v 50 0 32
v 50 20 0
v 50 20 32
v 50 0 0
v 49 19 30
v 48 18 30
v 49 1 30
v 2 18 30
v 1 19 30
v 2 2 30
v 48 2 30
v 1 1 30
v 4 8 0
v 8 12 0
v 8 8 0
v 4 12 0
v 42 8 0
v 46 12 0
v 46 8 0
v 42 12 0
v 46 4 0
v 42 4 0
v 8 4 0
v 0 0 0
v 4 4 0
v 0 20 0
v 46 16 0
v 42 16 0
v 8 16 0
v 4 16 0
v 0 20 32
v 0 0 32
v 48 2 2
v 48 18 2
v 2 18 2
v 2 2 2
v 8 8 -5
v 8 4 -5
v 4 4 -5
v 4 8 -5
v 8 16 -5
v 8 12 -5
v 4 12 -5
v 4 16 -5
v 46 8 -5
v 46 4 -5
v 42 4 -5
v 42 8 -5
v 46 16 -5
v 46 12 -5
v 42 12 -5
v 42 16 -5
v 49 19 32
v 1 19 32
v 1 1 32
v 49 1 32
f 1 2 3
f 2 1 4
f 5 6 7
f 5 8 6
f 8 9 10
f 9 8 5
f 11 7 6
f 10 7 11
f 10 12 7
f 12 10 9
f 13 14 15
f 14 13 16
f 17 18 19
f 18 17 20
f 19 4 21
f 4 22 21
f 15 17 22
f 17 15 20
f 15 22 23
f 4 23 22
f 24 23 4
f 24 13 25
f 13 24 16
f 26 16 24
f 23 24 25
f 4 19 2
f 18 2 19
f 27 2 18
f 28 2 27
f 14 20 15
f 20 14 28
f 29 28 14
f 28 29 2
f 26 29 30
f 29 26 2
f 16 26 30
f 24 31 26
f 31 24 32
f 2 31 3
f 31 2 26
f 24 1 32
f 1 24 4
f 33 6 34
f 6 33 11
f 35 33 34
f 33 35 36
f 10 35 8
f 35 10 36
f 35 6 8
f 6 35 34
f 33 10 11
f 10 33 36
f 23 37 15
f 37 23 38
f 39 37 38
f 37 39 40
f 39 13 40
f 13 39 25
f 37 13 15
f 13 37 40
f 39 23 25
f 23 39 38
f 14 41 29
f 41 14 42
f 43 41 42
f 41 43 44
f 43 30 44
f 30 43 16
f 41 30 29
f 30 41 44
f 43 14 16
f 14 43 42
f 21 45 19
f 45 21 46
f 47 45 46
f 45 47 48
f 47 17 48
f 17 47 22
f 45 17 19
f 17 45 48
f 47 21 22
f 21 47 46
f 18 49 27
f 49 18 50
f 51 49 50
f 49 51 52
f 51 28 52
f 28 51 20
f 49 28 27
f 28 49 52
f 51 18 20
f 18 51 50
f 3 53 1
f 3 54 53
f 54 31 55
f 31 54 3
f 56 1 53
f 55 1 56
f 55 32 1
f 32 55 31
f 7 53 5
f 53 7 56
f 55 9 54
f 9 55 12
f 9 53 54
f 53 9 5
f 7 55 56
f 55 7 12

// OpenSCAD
// Colored Box Example
// Demonstrates color parameter support in OpenSCAD Assistive Forge

/* [Dimensions] */
width = 50; // [10:100] Box width (mm)
height = 30; // [10:100] Box height (mm)
depth = 20; // [10:100] Box depth (mm)
wall_thickness = 2; // [1:0.5:5] Wall thickness (mm)

/* [Appearance] */
box_color = "FF6B35"; // [color] Primary box color
accent_color = "004E89"; // [color] Accent color for details
use_colors = "yes"; // [yes, no] Use colors in preview

/* [Details] */
add_lid = "yes"; // [yes, no] Add a lid
add_feet = "yes"; // [yes, no] Add feet to bottom

module colored_box() {
    if (use_colors == "yes") {
        // Color the full shell result so interior faces from difference()
        // inherit box_color instead of CSG operation colors.
        color(str("#", box_color))
        difference() {
            // Outer box
            color(str("#", box_color))
            cube([width, depth, height]);
            
            // Hollow interior
            translate([wall_thickness, wall_thickness, wall_thickness])
            cube([
                width - 2 * wall_thickness, 
                depth - 2 * wall_thickness, 
                height
            ]);
        }
    } else {
        difference() {
            // Outer box
            cube([width, depth, height]);
            
            // Hollow interior
            translate([wall_thickness, wall_thickness, wall_thickness])
            cube([
                width - 2 * wall_thickness, 
                depth - 2 * wall_thickness, 
                height
            ]);
        }
    }
    
    // Add feet if enabled
    if (add_feet == "yes") {
        foot_size = wall_thickness * 2;
        foot_height = 5;
        
        if (use_colors == "yes") {
            color(str("#", accent_color))
            for (x = [foot_size, width - foot_size * 2]) {
                for (y = [foot_size, depth - foot_size * 2]) {
                    translate([x, y, -foot_height])
                    cube([foot_size, foot_size, foot_height]);
                }
            }
        } else {
            for (x = [foot_size, width - foot_size * 2]) {
                for (y = [foot_size, depth - foot_size * 2]) {
                    translate([x, y, -foot_height])
                    cube([foot_size, foot_size, foot_height]);
                }
            }
        }
    }
    
    // Add lid if enabled
    if (add_lid == "yes") {
        lid_overlap = wall_thickness / 2;
        
        if (use_colors == "yes") {
            color(str("#", accent_color))
            translate([0, 0, height])
            difference() {
                cube([width, depth, wall_thickness]);
                translate([lid_overlap, lid_overlap, -1])
                cube([
                    width - 2 * lid_overlap, 
                    depth - 2 * lid_overlap, 
                    wall_thickness + 2
                ]);
            }
        } else {
            translate([0, 0, height])
            difference() {
                cube([width, depth, wall_thickness]);
                translate([lid_overlap, lid_overlap, -1])
                cube([
                    width - 2 * lid_overlap, 
                    depth - 2 * lid_overlap, 
                    wall_thickness + 2
                ]);
            }
        }
    }
}

// Render the box
colored_box();

// Instructions:
// 1. Click the color boxes to select your preferred colors
// 2. Or enter hex codes directly (RRGGBB format)
// 3. Adjust dimensions using the sliders
// 4. Toggle features with yes/no switches
// 5. Click "Generate" to create your customized box
